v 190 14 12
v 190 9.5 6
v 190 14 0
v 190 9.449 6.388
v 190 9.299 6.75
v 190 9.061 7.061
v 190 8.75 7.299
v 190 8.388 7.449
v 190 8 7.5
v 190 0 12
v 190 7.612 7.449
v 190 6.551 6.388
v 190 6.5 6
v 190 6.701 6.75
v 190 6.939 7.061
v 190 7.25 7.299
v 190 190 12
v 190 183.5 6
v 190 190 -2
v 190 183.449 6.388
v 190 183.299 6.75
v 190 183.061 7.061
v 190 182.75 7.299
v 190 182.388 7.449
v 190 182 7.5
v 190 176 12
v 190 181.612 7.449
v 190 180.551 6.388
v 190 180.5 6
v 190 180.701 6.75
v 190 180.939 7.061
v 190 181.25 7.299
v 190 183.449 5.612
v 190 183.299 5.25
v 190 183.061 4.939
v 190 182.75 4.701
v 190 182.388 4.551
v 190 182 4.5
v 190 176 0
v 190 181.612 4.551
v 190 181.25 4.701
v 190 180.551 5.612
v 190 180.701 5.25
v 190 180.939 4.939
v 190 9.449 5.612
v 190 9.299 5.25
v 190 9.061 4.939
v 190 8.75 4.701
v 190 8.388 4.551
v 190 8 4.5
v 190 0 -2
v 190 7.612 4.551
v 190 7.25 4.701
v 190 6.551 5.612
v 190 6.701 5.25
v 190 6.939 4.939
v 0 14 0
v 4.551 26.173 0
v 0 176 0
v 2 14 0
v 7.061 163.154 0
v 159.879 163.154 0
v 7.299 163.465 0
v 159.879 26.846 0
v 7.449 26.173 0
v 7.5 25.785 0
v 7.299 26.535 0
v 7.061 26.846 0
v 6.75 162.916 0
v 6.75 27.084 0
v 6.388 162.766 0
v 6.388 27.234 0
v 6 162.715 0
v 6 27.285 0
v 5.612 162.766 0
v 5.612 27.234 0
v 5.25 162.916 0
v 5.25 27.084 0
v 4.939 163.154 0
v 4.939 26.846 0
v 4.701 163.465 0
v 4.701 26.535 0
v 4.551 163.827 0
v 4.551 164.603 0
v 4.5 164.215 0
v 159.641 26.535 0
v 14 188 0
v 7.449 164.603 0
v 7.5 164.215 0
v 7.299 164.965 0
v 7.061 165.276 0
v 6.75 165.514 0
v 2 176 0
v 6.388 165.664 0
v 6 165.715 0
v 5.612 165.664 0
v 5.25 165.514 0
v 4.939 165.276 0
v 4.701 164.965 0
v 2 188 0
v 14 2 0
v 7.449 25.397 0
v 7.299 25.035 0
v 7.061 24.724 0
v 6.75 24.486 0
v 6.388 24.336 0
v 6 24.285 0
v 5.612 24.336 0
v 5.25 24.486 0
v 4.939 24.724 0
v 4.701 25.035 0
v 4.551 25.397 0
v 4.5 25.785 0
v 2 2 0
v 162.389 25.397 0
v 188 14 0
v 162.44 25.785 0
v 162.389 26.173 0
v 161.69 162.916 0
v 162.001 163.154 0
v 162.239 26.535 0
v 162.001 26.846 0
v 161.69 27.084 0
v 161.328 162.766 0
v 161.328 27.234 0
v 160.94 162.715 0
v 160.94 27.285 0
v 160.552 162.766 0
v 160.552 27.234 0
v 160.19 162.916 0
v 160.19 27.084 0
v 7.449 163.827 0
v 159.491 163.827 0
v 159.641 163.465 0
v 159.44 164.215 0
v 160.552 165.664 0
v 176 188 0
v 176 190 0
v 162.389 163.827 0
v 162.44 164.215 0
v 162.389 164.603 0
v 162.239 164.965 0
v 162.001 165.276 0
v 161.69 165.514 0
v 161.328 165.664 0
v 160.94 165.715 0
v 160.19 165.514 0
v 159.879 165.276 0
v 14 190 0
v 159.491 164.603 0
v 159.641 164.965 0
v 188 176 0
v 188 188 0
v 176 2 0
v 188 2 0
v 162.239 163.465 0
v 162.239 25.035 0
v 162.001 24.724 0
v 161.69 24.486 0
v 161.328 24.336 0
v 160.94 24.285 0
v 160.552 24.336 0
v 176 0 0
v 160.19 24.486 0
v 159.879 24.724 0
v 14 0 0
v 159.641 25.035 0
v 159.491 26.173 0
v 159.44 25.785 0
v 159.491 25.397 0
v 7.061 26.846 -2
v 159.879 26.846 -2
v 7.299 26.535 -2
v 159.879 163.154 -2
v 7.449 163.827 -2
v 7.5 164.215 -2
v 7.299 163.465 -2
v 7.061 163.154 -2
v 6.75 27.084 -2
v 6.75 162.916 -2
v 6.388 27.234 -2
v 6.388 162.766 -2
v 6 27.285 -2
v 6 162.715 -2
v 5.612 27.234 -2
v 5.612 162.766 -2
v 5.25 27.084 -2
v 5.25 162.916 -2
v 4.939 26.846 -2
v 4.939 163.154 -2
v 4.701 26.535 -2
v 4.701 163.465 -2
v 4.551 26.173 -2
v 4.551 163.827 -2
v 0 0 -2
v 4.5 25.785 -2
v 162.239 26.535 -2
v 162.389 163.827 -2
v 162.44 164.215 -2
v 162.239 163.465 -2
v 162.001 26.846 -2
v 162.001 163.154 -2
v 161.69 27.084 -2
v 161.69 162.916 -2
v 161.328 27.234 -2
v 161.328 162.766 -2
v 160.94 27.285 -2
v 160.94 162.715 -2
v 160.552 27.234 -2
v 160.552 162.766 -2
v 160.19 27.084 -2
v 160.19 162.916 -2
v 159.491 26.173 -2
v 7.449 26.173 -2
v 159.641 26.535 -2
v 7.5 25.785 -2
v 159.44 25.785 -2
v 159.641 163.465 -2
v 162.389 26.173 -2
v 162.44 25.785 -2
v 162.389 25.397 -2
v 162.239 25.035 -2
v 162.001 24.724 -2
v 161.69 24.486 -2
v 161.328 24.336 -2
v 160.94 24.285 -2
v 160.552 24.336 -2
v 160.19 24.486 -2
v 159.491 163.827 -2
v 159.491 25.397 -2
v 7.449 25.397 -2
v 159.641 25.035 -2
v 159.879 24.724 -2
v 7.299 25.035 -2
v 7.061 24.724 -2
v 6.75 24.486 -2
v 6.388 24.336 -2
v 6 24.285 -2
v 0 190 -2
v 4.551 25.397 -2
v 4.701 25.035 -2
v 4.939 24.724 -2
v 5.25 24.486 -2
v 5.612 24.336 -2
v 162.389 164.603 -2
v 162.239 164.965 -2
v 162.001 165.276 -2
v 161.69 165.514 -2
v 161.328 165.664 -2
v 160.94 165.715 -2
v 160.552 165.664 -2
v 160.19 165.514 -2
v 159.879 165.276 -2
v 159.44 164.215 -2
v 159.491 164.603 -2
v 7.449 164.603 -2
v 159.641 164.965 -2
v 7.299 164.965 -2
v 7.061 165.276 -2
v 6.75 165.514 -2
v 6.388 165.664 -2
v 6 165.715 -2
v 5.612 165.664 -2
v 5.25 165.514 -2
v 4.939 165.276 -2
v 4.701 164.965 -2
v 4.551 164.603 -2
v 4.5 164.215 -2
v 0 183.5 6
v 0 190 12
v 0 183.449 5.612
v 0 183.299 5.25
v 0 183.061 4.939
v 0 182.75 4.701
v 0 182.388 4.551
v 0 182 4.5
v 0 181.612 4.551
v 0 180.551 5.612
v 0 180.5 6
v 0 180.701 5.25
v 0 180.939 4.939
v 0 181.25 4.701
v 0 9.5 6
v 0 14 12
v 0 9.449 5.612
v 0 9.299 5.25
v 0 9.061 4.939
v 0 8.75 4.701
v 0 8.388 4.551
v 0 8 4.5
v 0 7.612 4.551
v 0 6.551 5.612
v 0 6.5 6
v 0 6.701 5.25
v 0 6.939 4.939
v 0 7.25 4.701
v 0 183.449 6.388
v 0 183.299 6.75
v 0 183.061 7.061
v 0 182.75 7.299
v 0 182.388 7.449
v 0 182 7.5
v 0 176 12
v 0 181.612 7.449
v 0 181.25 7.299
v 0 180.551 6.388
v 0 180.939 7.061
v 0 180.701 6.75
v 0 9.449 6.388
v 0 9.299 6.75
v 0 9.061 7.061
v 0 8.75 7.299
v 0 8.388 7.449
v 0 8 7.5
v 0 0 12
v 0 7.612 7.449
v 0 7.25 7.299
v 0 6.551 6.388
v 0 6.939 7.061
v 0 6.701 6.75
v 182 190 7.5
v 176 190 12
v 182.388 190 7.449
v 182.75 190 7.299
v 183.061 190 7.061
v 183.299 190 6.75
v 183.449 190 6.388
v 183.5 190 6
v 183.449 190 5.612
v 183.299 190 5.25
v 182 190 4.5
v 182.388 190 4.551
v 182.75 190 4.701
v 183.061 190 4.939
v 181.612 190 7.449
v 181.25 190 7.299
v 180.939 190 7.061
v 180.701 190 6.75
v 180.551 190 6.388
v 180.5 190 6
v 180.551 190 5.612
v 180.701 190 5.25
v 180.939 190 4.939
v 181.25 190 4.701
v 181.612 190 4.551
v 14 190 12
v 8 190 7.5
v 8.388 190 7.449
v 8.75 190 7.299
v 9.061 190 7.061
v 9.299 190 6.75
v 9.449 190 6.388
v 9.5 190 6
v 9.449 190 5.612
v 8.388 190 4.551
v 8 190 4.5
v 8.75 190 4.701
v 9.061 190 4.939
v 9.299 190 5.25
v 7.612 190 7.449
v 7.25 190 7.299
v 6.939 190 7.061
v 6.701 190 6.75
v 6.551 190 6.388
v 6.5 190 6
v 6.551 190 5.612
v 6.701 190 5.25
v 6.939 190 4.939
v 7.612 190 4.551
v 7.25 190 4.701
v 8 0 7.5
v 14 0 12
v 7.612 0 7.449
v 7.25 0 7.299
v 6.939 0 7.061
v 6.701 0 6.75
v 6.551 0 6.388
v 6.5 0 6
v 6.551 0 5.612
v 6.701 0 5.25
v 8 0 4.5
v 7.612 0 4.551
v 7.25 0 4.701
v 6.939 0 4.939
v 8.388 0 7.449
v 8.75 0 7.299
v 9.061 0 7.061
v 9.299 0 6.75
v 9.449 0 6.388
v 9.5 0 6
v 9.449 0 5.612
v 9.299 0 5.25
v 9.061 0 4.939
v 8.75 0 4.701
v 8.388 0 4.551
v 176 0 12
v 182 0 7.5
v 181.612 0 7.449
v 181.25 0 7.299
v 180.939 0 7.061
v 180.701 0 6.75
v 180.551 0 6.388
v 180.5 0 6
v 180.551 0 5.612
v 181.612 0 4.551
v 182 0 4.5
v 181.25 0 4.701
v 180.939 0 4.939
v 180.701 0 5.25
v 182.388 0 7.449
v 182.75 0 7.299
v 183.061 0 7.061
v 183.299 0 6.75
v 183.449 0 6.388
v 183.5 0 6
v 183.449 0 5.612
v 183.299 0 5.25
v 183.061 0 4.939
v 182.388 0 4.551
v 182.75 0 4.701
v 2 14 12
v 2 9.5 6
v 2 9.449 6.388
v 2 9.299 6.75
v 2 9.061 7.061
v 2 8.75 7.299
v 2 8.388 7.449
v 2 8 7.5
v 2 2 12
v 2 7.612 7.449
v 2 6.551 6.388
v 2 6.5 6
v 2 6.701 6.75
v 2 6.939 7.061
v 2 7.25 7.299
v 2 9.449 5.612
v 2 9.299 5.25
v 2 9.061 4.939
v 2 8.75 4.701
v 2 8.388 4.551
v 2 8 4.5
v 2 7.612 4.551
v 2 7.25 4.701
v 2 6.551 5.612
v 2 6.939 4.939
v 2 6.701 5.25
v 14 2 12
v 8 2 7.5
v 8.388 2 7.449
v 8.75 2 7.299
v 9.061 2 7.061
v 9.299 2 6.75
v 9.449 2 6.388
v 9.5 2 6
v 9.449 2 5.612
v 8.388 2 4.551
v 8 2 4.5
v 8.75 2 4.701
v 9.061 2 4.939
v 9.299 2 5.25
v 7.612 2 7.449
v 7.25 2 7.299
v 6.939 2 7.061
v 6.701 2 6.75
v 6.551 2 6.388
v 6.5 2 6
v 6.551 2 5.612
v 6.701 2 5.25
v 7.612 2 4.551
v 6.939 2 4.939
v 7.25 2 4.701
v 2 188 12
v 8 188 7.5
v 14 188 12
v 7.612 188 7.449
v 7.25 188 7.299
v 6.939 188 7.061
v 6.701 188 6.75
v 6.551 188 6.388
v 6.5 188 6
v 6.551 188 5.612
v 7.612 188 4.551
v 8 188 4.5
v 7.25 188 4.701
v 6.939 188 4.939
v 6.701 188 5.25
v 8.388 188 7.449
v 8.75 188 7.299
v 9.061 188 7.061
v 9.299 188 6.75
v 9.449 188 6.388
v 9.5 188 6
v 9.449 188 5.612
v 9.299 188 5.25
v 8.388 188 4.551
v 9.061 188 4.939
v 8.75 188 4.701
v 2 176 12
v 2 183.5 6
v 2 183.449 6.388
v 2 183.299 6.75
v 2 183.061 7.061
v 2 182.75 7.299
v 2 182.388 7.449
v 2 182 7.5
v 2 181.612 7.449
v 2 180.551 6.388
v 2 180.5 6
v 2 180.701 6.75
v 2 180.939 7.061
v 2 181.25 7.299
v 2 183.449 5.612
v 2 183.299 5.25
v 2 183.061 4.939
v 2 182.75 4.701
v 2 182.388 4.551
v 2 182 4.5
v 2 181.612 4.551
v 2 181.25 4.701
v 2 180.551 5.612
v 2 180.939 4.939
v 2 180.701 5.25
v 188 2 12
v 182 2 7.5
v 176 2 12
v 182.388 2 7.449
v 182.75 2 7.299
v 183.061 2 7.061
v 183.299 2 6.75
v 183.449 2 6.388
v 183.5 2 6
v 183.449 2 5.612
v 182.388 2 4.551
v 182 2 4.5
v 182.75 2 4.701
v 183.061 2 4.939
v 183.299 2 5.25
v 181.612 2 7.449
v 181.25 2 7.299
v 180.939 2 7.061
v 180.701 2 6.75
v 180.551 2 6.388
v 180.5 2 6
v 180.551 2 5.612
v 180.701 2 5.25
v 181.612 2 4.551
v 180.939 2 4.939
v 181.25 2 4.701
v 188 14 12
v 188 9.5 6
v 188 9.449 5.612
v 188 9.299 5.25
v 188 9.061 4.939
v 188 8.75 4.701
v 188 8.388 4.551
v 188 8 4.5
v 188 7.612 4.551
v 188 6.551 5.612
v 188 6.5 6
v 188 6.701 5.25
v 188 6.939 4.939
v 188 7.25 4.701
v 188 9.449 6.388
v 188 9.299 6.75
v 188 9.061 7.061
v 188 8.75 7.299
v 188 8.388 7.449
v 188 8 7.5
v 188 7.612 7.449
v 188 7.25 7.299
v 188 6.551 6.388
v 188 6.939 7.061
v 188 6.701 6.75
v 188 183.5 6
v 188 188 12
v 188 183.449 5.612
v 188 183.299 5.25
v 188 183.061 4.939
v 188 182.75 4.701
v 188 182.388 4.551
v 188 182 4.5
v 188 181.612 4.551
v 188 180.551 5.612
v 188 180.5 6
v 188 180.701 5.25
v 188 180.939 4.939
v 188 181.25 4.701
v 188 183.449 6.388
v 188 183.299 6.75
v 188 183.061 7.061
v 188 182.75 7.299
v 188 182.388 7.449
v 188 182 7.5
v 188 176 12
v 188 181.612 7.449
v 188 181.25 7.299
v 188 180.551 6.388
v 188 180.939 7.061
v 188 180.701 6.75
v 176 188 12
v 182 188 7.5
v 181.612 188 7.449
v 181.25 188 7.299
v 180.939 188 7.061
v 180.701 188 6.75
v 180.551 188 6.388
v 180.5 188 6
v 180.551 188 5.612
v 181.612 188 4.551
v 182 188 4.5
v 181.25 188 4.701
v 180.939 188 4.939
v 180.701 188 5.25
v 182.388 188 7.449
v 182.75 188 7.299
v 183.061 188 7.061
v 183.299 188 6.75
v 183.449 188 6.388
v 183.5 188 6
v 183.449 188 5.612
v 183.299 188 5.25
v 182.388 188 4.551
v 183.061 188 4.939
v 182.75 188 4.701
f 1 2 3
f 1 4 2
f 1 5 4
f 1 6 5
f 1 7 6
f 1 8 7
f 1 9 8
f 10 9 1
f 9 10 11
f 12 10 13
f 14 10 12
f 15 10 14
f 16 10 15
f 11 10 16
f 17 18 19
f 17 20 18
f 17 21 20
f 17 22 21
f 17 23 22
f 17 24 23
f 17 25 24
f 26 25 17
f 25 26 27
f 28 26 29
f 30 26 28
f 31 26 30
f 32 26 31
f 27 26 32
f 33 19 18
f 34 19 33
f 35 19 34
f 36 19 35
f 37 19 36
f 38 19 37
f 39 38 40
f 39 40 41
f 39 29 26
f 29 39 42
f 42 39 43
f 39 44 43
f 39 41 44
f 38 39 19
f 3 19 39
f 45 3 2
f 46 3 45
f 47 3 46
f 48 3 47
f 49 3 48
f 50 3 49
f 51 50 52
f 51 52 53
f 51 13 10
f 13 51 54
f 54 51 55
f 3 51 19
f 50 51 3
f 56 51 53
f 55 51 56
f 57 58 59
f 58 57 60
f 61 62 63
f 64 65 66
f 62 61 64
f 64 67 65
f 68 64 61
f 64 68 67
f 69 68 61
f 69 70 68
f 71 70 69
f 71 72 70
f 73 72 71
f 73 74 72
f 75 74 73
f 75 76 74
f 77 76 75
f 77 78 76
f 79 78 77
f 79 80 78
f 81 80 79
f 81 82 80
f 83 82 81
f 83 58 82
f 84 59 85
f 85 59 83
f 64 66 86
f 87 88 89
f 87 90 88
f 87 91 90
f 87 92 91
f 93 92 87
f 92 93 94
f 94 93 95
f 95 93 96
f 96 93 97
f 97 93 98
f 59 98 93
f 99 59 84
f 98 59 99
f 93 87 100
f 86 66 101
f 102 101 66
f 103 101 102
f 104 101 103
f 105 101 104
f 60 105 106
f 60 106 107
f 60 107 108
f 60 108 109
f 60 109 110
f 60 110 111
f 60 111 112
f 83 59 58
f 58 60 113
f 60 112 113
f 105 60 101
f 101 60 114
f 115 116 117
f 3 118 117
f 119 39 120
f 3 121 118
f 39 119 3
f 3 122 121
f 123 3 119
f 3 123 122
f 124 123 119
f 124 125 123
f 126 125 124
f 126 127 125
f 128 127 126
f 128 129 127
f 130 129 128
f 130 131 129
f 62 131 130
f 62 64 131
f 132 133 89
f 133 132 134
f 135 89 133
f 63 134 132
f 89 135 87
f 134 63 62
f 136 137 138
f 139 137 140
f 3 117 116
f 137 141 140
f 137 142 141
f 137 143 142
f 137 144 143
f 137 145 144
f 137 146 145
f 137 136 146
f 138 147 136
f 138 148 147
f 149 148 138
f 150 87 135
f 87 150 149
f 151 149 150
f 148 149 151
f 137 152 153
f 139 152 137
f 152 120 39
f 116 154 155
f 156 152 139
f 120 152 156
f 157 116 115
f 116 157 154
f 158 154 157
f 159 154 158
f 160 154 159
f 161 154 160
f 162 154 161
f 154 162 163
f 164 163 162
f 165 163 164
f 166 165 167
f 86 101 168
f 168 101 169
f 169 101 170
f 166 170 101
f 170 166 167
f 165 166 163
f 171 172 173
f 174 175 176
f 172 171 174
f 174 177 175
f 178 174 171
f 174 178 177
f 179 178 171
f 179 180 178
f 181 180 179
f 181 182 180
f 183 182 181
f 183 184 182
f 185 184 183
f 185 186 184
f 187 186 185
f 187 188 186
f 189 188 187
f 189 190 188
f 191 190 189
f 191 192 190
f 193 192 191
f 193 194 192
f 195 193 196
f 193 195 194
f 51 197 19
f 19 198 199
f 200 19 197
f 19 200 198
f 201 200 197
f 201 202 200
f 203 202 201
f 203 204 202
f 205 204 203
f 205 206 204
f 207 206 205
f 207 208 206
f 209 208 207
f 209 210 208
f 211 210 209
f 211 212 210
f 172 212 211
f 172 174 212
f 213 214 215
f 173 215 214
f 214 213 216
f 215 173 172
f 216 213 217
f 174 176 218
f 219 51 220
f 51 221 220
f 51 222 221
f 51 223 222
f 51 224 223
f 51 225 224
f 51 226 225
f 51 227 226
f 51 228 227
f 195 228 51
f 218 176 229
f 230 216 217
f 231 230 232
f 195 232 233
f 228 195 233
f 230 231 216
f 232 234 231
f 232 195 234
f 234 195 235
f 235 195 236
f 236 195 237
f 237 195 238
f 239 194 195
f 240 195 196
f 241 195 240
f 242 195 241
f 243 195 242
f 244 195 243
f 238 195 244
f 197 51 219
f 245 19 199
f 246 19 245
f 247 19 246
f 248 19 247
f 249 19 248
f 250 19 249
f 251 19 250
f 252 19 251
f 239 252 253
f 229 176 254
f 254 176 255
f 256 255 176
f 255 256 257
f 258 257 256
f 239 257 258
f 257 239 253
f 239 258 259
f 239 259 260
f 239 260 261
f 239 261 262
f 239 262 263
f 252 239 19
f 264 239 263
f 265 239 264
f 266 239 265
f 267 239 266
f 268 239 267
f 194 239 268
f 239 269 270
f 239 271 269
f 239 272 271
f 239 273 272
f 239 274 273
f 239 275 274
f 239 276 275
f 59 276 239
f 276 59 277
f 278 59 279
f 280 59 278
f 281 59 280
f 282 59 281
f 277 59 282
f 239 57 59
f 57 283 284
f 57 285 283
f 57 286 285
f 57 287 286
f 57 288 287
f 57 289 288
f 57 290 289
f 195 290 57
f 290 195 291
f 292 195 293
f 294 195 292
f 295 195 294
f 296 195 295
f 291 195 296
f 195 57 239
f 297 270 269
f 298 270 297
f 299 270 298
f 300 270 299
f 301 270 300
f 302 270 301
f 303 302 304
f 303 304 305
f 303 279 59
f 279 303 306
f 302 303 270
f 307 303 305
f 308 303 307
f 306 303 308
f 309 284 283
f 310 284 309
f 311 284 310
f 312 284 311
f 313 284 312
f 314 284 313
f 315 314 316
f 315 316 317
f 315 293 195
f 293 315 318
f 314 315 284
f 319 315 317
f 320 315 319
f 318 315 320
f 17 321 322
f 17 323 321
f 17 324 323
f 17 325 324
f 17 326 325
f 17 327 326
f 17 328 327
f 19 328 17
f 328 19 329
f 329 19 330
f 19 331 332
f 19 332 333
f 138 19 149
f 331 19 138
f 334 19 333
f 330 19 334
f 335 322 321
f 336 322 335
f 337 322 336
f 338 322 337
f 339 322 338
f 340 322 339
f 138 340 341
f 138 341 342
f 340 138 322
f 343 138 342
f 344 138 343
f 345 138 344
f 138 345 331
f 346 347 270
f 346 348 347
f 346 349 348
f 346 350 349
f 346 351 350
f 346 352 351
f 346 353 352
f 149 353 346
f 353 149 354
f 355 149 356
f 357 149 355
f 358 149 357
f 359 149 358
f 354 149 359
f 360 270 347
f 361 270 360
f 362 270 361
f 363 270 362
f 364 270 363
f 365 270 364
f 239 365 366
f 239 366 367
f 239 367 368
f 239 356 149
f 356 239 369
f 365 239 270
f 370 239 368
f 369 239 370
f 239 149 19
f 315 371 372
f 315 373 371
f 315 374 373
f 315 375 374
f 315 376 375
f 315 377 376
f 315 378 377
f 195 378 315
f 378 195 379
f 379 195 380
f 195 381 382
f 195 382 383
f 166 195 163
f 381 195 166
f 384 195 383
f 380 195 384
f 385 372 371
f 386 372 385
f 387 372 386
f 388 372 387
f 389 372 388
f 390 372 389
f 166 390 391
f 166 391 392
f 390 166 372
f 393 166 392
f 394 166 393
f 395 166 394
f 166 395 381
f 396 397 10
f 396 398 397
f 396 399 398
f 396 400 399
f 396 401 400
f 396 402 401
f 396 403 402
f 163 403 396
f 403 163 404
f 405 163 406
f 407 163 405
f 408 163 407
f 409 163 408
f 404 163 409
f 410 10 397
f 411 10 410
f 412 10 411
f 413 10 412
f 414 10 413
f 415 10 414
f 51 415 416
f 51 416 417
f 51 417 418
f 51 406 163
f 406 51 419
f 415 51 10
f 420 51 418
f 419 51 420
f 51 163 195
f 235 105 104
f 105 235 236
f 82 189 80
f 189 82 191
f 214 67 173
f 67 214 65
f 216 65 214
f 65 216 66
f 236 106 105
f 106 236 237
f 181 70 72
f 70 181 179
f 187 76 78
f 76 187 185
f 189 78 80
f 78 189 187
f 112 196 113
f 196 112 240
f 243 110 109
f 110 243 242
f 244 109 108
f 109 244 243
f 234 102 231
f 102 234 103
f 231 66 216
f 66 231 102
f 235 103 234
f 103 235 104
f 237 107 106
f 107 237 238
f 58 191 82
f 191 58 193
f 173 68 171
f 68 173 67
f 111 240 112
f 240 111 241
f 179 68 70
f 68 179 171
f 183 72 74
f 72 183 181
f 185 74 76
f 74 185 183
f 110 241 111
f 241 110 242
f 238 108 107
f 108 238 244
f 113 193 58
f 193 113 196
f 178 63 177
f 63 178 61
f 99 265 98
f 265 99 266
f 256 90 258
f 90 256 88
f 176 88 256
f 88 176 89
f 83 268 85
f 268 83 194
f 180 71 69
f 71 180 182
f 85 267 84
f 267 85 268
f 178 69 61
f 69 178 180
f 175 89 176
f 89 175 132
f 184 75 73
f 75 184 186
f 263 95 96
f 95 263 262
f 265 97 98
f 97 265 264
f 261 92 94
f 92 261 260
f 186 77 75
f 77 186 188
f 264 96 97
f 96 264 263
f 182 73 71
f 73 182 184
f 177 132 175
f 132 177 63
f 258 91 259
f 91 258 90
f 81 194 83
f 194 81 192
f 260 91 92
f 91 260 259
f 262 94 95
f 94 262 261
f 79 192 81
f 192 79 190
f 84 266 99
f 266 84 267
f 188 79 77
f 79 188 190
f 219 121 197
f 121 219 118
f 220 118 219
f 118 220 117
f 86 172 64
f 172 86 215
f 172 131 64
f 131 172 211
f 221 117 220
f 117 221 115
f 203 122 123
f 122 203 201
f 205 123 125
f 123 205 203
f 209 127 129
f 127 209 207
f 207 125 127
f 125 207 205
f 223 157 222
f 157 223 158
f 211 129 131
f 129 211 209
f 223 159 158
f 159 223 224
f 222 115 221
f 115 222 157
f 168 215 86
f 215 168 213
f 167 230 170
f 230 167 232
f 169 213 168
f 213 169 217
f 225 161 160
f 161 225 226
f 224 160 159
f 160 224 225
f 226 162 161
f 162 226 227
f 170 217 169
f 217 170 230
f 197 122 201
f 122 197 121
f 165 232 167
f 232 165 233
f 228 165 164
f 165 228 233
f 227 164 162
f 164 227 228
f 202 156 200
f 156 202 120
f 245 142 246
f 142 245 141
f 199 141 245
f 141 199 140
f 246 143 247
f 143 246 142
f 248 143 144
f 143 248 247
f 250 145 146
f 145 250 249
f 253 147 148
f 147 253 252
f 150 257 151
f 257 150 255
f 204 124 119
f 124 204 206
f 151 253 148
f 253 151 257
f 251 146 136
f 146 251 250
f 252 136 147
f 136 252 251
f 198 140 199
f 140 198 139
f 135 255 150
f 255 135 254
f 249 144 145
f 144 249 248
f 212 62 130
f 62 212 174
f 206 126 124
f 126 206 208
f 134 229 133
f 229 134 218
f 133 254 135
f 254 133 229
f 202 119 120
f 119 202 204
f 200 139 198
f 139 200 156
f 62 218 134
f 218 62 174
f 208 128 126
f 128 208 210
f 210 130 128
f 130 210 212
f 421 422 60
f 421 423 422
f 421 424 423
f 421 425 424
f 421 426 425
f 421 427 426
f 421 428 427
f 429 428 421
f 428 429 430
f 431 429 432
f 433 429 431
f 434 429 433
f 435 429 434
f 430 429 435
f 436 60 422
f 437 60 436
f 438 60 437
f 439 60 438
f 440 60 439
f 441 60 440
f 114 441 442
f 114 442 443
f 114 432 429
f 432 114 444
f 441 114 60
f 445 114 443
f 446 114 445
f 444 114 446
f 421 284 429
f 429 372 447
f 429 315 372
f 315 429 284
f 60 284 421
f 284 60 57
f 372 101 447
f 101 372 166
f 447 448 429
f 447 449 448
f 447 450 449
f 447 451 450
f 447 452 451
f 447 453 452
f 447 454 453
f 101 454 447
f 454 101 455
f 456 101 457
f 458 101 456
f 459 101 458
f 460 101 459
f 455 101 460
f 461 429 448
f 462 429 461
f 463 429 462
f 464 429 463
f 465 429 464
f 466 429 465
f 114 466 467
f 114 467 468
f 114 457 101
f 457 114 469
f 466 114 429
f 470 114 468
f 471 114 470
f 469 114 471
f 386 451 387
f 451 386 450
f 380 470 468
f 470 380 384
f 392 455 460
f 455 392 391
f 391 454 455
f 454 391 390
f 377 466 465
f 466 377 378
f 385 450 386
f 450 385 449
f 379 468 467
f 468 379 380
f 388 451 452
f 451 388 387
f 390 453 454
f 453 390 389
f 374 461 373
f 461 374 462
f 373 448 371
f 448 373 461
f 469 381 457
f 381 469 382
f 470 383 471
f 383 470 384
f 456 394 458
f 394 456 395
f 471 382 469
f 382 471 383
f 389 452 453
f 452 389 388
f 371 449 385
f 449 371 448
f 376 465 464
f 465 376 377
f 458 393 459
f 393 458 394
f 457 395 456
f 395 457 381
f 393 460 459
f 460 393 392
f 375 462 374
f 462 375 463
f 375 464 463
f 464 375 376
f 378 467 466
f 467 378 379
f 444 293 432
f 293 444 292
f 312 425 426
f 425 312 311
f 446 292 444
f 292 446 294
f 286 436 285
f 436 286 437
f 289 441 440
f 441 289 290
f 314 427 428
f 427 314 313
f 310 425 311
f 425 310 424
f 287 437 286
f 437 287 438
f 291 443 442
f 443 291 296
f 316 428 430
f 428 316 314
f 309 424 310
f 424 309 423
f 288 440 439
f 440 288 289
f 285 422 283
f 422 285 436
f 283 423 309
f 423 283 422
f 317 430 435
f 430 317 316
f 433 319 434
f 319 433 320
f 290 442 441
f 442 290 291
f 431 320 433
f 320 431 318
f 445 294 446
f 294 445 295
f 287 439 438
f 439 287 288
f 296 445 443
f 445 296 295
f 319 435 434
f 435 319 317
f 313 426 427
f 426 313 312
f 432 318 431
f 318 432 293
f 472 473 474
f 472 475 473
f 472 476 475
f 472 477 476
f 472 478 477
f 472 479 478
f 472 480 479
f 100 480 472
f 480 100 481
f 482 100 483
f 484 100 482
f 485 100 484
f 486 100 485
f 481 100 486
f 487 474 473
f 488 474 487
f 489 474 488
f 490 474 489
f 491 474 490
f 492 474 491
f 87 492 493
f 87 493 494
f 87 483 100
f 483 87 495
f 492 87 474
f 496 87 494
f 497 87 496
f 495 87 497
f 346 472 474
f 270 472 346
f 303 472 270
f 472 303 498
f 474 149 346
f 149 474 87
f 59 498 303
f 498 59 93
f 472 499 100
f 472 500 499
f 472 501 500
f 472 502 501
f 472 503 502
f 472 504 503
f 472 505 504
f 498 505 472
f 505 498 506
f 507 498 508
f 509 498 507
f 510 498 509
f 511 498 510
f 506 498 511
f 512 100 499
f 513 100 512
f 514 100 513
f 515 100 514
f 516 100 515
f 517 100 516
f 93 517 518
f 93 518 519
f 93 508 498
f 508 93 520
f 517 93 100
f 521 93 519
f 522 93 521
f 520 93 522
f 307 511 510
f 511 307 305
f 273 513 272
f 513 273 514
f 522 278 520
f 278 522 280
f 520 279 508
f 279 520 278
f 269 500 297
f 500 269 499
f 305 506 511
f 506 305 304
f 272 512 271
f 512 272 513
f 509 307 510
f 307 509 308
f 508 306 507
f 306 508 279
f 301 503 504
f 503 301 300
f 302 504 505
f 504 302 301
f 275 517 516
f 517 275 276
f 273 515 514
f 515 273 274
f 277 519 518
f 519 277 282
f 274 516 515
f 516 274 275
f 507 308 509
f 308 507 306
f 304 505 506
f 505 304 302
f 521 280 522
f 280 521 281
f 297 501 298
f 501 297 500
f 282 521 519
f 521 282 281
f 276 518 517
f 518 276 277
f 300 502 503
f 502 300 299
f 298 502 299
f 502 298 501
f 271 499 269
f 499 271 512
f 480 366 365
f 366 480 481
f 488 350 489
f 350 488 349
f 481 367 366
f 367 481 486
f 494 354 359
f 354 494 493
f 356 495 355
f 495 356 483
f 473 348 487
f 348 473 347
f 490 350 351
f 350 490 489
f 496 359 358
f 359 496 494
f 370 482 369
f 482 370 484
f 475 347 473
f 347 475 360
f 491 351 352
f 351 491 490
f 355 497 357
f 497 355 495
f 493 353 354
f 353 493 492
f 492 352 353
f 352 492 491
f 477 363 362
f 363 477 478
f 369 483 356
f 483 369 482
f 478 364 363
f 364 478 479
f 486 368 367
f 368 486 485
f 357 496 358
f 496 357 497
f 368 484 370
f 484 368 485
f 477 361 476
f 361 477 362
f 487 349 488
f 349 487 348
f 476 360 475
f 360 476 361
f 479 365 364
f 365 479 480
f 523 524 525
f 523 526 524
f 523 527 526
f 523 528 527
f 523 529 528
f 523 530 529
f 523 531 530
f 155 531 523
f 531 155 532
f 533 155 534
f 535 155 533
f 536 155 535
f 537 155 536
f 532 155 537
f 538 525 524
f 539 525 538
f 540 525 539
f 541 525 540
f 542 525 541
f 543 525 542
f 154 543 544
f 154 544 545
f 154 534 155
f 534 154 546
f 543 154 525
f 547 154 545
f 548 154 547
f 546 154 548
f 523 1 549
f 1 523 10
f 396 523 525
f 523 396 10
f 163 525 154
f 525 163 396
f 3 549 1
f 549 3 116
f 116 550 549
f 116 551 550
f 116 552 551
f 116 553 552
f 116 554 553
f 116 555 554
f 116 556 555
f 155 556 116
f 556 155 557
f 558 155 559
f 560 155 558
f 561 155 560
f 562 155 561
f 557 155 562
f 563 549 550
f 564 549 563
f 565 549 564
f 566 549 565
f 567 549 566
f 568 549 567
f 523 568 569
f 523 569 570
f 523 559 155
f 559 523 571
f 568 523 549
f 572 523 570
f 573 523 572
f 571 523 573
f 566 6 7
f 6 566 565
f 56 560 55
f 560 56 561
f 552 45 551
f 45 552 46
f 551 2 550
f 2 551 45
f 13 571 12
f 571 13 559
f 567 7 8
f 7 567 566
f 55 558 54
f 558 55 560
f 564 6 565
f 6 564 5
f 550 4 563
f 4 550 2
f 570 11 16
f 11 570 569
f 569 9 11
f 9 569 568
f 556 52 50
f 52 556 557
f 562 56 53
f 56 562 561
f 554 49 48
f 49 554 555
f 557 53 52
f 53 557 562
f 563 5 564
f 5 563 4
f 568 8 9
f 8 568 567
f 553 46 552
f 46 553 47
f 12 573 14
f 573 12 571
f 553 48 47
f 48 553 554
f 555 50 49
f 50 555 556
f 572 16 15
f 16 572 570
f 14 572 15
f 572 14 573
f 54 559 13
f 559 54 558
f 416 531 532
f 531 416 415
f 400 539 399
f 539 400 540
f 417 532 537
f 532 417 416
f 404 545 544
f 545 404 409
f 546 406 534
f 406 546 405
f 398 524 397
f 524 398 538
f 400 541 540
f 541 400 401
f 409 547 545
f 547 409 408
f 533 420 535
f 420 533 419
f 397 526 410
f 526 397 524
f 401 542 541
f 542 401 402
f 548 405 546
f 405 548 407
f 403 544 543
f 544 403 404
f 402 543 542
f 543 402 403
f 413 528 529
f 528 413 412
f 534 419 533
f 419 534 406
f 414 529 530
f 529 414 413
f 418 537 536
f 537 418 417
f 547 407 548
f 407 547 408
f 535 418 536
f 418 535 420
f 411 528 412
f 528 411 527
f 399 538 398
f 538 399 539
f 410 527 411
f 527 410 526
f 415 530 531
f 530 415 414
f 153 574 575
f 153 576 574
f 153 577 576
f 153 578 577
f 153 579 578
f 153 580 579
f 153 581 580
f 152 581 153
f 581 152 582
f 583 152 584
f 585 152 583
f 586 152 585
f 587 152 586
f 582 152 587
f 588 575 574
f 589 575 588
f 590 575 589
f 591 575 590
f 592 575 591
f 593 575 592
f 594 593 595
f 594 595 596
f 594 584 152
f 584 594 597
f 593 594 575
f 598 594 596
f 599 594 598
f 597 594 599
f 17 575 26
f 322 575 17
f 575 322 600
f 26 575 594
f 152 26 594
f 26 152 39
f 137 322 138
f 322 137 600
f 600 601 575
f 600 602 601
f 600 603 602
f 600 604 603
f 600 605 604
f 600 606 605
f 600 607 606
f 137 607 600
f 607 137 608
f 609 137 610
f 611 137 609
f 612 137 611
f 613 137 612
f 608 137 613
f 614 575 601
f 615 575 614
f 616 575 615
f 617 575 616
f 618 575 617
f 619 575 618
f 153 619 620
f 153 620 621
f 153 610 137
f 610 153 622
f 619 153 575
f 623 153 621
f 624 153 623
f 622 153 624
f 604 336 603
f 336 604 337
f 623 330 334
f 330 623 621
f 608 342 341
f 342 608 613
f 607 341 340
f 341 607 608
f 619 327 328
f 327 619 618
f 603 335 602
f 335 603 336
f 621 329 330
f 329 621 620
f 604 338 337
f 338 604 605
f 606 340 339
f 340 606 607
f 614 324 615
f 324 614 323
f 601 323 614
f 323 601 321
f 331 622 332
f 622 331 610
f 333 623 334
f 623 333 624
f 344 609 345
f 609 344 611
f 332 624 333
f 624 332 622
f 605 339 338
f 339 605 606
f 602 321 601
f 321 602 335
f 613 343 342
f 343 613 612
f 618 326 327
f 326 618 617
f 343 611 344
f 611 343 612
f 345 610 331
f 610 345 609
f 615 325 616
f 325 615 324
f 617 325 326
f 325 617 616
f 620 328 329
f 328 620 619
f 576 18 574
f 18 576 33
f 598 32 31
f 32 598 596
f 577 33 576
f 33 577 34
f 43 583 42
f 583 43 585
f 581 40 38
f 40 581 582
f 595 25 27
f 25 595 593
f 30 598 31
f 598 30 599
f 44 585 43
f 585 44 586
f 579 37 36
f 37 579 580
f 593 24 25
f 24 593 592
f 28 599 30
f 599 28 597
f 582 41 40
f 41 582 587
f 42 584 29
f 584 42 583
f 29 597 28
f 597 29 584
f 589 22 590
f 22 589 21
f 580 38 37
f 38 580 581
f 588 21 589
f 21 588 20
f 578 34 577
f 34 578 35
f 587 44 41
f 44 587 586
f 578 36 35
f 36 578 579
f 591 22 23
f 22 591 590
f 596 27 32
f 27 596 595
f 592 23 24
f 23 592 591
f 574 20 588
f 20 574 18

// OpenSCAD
$fa = 1;
$fs = 0.4;

err = 0.0001;
esp = 2.0;

d = 3.0;
L = 190.0;
W = 190.0;
L1 = 12.0;

// Dimensões da placa
Wb = 148.59;
Lb = 165.1;

gapy = (190-148.59) /2;

union(){
    difference(){
        translate([0,0,-esp+err])
        cube([L, W, esp]);
    
        translate([6, gapy+5.08, -10])
        cylinder(h=20, r=1.5);
        
        translate([6, gapy+Wb-5.08, -10])
        cylinder(h=20, r=1.5);

        translate([6+Lb-2*5.08, gapy+5.08, -10])
        cylinder(h=20, r=1.5);
           
        translate([6+Lb-2*5.08, gapy+Wb-5.08, -10])
        cylinder(h=20, r=1.5);
        
     }

    difference(){
       union(){
            cube([esp, L1+esp, L1]);
            cube([L1+esp, esp, L1]);
        }
     translate([L1+esp-6,-10, L1/2]) 
     rotate([-90,0,0])
     cylinder(h=20, r=1.5);

     translate([-10,L1+esp-6, L1/2]) 
     rotate([0,90,0])
     cylinder(h=20, r=1.5);
     
    }

translate([0,190,0])
rotate([0,0,-90])
    difference(){
       union(){
            cube([esp, L1+esp, L1]);
            cube([L1+esp, esp, L1]);
        }
     translate([L1+esp-6,-10, L1/2]) 
     rotate([-90,0,0])
     cylinder(h=20, r=1.5);

     translate([-10,L1+esp-6, L1/2]) 
     rotate([0,90,0])
     cylinder(h=20, r=1.5);
     
    }
    
translate([190,0,0])
rotate([0,0,90])
    difference(){
       union(){
            cube([esp, L1+esp, L1]);
            cube([L1+esp, esp, L1]);
        }
     translate([L1+esp-6,-10, L1/2]) 
     rotate([-90,0,0])
     cylinder(h=20, r=1.5);

     translate([-10,L1+esp-6, L1/2]) 
     rotate([0,90,0])
     cylinder(h=20, r=1.5);
     
    }
    
    
translate([190,190,0])
rotate([0,0,-180])
    difference(){
       union(){
            cube([esp, L1+esp, L1]);
            cube([L1+esp, esp, L1]);
        }
     translate([L1+esp-6,-10, L1/2]) 
     rotate([-90,0,0])
     cylinder(h=20, r=1.5);

     translate([-10,L1+esp-6, L1/2]) 
     rotate([0,90,0])
     cylinder(h=20, r=1.5);
     
    }
    
}
